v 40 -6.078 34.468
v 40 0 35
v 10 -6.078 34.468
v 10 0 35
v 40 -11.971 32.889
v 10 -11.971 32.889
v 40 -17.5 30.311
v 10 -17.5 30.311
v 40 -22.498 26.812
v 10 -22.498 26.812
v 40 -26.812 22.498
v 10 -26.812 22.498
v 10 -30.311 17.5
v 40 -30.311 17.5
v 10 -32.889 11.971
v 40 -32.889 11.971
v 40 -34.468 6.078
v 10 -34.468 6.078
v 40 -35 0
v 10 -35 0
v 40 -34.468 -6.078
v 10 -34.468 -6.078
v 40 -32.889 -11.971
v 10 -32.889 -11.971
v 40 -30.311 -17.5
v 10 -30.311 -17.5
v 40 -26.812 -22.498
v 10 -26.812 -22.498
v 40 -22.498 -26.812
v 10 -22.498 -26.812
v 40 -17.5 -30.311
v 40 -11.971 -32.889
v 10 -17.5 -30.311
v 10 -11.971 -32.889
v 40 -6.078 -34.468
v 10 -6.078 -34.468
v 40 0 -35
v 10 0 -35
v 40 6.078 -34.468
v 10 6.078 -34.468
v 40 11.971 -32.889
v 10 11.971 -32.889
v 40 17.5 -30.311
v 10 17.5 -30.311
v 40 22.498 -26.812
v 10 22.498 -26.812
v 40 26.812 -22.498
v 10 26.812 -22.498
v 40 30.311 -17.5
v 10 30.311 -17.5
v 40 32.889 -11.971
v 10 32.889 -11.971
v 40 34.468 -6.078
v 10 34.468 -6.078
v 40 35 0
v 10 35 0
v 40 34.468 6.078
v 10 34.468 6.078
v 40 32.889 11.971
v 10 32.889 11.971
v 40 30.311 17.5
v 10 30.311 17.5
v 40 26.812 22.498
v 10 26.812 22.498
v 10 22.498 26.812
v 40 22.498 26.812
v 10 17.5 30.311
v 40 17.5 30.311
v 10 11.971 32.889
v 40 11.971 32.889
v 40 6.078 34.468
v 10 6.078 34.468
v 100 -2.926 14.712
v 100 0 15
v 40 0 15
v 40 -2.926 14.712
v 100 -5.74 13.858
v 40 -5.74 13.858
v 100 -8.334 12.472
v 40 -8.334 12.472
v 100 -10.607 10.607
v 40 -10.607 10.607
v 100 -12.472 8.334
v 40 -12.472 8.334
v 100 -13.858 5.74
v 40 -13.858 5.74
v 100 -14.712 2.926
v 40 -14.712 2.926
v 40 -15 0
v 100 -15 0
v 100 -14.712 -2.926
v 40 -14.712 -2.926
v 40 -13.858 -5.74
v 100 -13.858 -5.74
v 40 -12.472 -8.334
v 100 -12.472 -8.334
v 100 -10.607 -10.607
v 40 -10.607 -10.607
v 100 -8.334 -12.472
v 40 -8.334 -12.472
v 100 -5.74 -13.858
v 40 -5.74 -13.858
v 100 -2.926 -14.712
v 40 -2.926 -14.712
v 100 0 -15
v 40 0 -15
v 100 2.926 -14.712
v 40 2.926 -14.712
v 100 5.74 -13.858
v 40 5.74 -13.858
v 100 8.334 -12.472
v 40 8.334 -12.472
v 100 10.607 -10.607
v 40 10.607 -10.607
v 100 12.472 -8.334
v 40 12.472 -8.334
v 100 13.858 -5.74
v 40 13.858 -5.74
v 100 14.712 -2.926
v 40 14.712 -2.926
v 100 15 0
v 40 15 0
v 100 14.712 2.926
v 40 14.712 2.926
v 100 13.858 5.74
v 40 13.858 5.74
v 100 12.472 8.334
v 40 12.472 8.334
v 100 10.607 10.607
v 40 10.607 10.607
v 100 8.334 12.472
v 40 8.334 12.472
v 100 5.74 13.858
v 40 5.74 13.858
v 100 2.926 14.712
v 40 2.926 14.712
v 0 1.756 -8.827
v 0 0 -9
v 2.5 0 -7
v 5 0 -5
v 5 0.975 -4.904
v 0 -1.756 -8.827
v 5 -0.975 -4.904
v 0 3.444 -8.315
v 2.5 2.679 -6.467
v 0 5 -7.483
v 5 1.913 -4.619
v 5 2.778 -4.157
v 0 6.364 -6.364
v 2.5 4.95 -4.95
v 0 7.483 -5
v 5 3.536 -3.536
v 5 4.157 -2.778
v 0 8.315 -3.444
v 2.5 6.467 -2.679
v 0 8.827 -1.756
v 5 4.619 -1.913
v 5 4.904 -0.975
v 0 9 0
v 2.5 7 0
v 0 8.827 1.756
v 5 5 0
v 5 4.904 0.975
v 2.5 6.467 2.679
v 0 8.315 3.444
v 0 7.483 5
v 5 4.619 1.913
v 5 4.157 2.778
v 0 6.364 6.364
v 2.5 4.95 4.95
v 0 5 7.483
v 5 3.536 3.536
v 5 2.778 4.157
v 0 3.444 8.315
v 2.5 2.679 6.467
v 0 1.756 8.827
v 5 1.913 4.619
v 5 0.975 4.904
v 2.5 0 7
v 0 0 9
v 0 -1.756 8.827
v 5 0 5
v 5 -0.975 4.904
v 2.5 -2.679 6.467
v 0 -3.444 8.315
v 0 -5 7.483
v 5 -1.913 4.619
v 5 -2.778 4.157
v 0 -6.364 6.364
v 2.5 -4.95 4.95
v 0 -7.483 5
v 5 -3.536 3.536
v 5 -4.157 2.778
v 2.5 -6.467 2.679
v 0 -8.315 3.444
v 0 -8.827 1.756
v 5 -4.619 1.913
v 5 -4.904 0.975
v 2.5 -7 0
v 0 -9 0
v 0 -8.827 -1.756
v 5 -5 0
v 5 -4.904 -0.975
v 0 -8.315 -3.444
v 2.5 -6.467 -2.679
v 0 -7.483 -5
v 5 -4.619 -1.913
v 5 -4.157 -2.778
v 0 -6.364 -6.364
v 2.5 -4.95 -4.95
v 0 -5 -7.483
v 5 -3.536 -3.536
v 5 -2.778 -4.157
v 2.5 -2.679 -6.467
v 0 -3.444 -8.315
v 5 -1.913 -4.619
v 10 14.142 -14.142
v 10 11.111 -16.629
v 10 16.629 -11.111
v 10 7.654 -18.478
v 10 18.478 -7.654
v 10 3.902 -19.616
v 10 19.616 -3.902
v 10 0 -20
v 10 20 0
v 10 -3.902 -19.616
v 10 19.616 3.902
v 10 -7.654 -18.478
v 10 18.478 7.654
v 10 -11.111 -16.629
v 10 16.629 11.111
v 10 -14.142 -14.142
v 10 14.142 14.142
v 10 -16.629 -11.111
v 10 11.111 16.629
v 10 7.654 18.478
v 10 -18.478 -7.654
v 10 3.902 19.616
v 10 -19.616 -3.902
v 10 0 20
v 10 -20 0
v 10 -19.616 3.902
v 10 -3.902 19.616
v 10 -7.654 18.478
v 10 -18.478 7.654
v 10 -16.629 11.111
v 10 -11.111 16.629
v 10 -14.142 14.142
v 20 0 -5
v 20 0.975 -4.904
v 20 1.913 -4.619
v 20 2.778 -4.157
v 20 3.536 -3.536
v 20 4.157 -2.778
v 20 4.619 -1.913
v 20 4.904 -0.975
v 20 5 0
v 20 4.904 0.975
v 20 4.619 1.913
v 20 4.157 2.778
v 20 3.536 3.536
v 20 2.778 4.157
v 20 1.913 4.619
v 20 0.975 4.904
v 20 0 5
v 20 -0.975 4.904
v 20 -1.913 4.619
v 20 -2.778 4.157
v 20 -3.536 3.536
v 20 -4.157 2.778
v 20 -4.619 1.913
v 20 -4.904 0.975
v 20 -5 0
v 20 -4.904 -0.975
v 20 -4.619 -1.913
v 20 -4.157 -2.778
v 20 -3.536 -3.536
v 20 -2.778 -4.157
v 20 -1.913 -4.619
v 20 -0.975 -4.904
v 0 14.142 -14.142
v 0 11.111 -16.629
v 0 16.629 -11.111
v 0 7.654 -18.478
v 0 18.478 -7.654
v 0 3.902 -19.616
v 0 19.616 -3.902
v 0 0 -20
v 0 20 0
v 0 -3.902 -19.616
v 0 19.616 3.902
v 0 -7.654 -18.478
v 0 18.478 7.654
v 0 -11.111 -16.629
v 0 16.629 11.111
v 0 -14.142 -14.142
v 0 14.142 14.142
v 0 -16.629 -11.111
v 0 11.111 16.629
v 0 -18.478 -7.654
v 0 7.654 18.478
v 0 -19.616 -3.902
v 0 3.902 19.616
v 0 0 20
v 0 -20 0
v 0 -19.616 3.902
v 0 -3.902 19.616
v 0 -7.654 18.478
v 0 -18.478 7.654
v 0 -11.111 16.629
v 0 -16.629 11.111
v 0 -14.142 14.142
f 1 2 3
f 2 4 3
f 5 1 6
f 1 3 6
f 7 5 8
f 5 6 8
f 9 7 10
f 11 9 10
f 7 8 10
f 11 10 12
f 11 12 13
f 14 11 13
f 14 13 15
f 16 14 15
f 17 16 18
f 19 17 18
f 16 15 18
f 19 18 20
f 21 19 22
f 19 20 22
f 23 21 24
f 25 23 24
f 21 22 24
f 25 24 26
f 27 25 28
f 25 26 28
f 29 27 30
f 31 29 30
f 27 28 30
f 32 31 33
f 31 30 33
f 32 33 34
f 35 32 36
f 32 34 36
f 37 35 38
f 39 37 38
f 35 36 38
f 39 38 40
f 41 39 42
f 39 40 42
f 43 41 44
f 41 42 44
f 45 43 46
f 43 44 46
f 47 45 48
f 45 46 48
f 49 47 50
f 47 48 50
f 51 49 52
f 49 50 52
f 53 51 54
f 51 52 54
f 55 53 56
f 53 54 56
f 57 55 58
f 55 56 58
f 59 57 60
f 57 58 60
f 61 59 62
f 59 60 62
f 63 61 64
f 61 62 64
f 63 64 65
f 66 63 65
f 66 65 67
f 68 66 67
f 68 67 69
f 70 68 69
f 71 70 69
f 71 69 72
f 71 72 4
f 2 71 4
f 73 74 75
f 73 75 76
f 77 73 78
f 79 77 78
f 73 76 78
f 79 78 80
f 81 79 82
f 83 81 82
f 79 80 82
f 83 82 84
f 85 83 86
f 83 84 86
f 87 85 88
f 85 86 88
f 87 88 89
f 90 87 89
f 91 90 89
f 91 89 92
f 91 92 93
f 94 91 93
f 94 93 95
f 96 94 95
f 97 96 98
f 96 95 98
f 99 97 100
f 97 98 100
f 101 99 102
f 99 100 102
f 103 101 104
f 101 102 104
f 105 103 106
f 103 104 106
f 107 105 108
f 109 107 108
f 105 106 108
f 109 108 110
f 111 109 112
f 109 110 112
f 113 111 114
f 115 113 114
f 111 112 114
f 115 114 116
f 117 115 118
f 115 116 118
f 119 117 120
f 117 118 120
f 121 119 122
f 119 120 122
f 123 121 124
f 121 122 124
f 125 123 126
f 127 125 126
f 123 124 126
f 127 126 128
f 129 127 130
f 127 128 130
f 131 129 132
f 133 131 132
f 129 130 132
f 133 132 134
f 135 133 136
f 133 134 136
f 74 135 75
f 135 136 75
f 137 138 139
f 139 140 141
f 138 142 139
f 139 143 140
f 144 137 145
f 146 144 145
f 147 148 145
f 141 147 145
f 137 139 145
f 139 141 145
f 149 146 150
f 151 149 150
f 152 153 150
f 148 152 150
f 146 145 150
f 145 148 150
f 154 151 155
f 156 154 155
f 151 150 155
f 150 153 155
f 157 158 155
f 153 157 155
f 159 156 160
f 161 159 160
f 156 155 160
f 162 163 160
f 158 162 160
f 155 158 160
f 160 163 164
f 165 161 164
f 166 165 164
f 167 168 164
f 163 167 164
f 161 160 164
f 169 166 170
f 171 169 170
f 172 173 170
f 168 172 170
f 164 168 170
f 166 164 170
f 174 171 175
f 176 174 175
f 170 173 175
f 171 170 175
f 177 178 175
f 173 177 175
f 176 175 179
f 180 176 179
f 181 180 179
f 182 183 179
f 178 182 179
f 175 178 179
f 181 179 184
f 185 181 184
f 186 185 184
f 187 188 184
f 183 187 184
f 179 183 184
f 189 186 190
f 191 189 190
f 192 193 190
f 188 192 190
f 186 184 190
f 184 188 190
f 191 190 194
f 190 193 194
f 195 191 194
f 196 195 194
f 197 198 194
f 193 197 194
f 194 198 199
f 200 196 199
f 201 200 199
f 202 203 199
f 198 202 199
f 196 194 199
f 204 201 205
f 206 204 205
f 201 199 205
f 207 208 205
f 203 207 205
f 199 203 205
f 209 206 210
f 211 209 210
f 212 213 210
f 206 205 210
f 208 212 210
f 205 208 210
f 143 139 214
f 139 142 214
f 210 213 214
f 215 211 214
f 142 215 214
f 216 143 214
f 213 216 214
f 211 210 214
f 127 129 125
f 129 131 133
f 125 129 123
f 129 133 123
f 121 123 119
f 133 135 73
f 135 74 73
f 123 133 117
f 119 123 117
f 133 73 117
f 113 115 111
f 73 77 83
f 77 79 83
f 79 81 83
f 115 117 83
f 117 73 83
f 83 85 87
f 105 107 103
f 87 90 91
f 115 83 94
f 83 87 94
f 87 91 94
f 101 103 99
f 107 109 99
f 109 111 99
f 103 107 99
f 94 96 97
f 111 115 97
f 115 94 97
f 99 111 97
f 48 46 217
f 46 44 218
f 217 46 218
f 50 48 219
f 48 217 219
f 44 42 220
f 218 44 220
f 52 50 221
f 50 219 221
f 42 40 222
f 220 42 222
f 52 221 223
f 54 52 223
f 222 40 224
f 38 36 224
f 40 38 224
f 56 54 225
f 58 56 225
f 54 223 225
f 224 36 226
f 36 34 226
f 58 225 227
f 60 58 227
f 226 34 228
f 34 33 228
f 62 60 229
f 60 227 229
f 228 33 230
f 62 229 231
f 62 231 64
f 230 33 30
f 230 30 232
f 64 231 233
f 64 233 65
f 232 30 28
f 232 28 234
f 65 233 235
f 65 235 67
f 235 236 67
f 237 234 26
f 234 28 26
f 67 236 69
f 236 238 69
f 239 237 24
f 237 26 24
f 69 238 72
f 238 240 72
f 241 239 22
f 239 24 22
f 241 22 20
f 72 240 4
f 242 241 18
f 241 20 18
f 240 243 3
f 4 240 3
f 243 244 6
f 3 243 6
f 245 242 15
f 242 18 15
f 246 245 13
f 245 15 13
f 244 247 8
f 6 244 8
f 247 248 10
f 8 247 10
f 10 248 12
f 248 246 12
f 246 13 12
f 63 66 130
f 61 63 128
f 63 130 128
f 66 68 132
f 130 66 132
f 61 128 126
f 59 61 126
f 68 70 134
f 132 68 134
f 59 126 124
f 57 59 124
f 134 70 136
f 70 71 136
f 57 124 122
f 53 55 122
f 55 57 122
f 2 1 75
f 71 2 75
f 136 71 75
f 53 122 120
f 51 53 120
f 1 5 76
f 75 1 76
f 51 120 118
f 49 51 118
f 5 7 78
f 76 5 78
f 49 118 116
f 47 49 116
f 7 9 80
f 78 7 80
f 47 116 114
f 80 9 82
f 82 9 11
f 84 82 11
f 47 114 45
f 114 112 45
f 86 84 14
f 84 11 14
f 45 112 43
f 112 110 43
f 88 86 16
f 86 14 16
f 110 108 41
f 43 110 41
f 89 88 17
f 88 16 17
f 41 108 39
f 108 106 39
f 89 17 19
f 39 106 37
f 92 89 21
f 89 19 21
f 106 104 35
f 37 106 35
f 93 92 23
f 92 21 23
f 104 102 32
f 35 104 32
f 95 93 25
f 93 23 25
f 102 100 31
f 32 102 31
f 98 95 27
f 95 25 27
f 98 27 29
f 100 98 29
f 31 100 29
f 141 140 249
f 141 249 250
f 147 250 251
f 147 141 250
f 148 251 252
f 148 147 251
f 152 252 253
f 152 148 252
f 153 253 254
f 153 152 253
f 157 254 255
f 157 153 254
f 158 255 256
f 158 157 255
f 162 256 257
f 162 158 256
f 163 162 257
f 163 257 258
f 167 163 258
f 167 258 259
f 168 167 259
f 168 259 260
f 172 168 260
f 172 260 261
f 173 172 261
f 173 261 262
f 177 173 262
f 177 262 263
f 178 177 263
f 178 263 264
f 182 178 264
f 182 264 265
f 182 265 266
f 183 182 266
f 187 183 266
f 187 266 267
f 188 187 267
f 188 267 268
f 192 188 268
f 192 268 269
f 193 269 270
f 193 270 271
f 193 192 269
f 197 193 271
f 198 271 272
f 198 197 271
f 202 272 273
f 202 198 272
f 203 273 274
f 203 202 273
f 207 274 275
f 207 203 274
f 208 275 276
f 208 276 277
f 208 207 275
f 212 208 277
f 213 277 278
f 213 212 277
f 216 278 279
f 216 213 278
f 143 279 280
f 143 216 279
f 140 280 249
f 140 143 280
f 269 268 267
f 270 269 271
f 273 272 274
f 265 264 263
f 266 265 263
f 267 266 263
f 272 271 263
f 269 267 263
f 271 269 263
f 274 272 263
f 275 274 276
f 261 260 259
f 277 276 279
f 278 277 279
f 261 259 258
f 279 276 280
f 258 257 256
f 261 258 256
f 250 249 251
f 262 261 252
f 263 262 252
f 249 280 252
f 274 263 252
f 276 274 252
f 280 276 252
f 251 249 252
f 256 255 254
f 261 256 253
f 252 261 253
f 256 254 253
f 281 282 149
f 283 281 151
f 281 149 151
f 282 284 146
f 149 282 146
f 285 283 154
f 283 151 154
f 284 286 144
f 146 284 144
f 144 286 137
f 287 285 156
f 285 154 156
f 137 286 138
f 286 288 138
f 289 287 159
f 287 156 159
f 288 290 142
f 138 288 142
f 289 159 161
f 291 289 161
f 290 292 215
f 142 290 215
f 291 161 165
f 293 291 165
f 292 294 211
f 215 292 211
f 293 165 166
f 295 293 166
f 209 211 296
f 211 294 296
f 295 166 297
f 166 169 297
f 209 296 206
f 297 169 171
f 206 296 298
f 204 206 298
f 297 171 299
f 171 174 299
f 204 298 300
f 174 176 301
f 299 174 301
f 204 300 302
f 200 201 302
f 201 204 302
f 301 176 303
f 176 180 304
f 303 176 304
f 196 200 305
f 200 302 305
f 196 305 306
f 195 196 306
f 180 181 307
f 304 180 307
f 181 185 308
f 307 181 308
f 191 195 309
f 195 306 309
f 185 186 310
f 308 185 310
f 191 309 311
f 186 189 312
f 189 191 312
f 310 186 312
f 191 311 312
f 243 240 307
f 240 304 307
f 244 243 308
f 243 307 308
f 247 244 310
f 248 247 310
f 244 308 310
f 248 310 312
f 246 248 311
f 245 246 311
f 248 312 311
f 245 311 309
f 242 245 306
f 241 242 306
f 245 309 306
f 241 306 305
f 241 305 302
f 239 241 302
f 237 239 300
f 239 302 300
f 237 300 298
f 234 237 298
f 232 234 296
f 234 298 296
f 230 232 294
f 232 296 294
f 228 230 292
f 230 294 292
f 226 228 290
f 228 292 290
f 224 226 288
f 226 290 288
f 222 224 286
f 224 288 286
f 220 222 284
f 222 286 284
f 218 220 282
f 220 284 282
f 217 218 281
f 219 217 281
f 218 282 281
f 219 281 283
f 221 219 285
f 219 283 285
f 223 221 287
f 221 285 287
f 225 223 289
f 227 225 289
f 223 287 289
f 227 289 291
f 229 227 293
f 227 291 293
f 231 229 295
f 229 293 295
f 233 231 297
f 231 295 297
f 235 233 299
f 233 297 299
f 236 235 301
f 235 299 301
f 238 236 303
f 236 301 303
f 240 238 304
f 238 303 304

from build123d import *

# Parameters (mm, degrees)
SKETCH_2_R          = 5
CUT_EXTRUDE_1_DEPTH = 20
SKETCH_3_R          = 9
CUT_EXTRUDE_2_DEPTH = 5
CUT_EXTRUDE_2_TAPER = 38.659808254


with BuildPart() as part:
    # Эскиз1 → Повернуть1 (revolve)
    with BuildSketch(Plane.XY, mode=Mode.PRIVATE) as revolve_1_sk:
        Polygon((0, 0), (100, 0), (100, 15), (40, 15), (40, 35), (10, 35), (10, 20), (0, 20), align=None)
    revolve(revolve_1_sk.sketch.rotate(Axis((0, 0, 0), (1, 0, 0)), 90), axis=Axis((0, 0, 0), (1, 0, 0)))

    # Эскиз2 → Вырез-Вытянуть1 (cut)
    with BuildSketch(Plane(origin=(0, 0, 0), x_dir=(0, 0, -1), z_dir=(1, 0, 0))):
        Circle(SKETCH_2_R)
    extrude(amount=CUT_EXTRUDE_1_DEPTH, mode=Mode.SUBTRACT)

    # Эскиз3 → Вырез-Вытянуть2 (cut)
    with BuildSketch(Plane(origin=(0, 0, 0), x_dir=(0, 0, -1), z_dir=(1, 0, 0))):
        Circle(SKETCH_3_R)
    extrude(amount=CUT_EXTRUDE_2_DEPTH, taper=CUT_EXTRUDE_2_TAPER, mode=Mode.SUBTRACT)


solid = part.part
